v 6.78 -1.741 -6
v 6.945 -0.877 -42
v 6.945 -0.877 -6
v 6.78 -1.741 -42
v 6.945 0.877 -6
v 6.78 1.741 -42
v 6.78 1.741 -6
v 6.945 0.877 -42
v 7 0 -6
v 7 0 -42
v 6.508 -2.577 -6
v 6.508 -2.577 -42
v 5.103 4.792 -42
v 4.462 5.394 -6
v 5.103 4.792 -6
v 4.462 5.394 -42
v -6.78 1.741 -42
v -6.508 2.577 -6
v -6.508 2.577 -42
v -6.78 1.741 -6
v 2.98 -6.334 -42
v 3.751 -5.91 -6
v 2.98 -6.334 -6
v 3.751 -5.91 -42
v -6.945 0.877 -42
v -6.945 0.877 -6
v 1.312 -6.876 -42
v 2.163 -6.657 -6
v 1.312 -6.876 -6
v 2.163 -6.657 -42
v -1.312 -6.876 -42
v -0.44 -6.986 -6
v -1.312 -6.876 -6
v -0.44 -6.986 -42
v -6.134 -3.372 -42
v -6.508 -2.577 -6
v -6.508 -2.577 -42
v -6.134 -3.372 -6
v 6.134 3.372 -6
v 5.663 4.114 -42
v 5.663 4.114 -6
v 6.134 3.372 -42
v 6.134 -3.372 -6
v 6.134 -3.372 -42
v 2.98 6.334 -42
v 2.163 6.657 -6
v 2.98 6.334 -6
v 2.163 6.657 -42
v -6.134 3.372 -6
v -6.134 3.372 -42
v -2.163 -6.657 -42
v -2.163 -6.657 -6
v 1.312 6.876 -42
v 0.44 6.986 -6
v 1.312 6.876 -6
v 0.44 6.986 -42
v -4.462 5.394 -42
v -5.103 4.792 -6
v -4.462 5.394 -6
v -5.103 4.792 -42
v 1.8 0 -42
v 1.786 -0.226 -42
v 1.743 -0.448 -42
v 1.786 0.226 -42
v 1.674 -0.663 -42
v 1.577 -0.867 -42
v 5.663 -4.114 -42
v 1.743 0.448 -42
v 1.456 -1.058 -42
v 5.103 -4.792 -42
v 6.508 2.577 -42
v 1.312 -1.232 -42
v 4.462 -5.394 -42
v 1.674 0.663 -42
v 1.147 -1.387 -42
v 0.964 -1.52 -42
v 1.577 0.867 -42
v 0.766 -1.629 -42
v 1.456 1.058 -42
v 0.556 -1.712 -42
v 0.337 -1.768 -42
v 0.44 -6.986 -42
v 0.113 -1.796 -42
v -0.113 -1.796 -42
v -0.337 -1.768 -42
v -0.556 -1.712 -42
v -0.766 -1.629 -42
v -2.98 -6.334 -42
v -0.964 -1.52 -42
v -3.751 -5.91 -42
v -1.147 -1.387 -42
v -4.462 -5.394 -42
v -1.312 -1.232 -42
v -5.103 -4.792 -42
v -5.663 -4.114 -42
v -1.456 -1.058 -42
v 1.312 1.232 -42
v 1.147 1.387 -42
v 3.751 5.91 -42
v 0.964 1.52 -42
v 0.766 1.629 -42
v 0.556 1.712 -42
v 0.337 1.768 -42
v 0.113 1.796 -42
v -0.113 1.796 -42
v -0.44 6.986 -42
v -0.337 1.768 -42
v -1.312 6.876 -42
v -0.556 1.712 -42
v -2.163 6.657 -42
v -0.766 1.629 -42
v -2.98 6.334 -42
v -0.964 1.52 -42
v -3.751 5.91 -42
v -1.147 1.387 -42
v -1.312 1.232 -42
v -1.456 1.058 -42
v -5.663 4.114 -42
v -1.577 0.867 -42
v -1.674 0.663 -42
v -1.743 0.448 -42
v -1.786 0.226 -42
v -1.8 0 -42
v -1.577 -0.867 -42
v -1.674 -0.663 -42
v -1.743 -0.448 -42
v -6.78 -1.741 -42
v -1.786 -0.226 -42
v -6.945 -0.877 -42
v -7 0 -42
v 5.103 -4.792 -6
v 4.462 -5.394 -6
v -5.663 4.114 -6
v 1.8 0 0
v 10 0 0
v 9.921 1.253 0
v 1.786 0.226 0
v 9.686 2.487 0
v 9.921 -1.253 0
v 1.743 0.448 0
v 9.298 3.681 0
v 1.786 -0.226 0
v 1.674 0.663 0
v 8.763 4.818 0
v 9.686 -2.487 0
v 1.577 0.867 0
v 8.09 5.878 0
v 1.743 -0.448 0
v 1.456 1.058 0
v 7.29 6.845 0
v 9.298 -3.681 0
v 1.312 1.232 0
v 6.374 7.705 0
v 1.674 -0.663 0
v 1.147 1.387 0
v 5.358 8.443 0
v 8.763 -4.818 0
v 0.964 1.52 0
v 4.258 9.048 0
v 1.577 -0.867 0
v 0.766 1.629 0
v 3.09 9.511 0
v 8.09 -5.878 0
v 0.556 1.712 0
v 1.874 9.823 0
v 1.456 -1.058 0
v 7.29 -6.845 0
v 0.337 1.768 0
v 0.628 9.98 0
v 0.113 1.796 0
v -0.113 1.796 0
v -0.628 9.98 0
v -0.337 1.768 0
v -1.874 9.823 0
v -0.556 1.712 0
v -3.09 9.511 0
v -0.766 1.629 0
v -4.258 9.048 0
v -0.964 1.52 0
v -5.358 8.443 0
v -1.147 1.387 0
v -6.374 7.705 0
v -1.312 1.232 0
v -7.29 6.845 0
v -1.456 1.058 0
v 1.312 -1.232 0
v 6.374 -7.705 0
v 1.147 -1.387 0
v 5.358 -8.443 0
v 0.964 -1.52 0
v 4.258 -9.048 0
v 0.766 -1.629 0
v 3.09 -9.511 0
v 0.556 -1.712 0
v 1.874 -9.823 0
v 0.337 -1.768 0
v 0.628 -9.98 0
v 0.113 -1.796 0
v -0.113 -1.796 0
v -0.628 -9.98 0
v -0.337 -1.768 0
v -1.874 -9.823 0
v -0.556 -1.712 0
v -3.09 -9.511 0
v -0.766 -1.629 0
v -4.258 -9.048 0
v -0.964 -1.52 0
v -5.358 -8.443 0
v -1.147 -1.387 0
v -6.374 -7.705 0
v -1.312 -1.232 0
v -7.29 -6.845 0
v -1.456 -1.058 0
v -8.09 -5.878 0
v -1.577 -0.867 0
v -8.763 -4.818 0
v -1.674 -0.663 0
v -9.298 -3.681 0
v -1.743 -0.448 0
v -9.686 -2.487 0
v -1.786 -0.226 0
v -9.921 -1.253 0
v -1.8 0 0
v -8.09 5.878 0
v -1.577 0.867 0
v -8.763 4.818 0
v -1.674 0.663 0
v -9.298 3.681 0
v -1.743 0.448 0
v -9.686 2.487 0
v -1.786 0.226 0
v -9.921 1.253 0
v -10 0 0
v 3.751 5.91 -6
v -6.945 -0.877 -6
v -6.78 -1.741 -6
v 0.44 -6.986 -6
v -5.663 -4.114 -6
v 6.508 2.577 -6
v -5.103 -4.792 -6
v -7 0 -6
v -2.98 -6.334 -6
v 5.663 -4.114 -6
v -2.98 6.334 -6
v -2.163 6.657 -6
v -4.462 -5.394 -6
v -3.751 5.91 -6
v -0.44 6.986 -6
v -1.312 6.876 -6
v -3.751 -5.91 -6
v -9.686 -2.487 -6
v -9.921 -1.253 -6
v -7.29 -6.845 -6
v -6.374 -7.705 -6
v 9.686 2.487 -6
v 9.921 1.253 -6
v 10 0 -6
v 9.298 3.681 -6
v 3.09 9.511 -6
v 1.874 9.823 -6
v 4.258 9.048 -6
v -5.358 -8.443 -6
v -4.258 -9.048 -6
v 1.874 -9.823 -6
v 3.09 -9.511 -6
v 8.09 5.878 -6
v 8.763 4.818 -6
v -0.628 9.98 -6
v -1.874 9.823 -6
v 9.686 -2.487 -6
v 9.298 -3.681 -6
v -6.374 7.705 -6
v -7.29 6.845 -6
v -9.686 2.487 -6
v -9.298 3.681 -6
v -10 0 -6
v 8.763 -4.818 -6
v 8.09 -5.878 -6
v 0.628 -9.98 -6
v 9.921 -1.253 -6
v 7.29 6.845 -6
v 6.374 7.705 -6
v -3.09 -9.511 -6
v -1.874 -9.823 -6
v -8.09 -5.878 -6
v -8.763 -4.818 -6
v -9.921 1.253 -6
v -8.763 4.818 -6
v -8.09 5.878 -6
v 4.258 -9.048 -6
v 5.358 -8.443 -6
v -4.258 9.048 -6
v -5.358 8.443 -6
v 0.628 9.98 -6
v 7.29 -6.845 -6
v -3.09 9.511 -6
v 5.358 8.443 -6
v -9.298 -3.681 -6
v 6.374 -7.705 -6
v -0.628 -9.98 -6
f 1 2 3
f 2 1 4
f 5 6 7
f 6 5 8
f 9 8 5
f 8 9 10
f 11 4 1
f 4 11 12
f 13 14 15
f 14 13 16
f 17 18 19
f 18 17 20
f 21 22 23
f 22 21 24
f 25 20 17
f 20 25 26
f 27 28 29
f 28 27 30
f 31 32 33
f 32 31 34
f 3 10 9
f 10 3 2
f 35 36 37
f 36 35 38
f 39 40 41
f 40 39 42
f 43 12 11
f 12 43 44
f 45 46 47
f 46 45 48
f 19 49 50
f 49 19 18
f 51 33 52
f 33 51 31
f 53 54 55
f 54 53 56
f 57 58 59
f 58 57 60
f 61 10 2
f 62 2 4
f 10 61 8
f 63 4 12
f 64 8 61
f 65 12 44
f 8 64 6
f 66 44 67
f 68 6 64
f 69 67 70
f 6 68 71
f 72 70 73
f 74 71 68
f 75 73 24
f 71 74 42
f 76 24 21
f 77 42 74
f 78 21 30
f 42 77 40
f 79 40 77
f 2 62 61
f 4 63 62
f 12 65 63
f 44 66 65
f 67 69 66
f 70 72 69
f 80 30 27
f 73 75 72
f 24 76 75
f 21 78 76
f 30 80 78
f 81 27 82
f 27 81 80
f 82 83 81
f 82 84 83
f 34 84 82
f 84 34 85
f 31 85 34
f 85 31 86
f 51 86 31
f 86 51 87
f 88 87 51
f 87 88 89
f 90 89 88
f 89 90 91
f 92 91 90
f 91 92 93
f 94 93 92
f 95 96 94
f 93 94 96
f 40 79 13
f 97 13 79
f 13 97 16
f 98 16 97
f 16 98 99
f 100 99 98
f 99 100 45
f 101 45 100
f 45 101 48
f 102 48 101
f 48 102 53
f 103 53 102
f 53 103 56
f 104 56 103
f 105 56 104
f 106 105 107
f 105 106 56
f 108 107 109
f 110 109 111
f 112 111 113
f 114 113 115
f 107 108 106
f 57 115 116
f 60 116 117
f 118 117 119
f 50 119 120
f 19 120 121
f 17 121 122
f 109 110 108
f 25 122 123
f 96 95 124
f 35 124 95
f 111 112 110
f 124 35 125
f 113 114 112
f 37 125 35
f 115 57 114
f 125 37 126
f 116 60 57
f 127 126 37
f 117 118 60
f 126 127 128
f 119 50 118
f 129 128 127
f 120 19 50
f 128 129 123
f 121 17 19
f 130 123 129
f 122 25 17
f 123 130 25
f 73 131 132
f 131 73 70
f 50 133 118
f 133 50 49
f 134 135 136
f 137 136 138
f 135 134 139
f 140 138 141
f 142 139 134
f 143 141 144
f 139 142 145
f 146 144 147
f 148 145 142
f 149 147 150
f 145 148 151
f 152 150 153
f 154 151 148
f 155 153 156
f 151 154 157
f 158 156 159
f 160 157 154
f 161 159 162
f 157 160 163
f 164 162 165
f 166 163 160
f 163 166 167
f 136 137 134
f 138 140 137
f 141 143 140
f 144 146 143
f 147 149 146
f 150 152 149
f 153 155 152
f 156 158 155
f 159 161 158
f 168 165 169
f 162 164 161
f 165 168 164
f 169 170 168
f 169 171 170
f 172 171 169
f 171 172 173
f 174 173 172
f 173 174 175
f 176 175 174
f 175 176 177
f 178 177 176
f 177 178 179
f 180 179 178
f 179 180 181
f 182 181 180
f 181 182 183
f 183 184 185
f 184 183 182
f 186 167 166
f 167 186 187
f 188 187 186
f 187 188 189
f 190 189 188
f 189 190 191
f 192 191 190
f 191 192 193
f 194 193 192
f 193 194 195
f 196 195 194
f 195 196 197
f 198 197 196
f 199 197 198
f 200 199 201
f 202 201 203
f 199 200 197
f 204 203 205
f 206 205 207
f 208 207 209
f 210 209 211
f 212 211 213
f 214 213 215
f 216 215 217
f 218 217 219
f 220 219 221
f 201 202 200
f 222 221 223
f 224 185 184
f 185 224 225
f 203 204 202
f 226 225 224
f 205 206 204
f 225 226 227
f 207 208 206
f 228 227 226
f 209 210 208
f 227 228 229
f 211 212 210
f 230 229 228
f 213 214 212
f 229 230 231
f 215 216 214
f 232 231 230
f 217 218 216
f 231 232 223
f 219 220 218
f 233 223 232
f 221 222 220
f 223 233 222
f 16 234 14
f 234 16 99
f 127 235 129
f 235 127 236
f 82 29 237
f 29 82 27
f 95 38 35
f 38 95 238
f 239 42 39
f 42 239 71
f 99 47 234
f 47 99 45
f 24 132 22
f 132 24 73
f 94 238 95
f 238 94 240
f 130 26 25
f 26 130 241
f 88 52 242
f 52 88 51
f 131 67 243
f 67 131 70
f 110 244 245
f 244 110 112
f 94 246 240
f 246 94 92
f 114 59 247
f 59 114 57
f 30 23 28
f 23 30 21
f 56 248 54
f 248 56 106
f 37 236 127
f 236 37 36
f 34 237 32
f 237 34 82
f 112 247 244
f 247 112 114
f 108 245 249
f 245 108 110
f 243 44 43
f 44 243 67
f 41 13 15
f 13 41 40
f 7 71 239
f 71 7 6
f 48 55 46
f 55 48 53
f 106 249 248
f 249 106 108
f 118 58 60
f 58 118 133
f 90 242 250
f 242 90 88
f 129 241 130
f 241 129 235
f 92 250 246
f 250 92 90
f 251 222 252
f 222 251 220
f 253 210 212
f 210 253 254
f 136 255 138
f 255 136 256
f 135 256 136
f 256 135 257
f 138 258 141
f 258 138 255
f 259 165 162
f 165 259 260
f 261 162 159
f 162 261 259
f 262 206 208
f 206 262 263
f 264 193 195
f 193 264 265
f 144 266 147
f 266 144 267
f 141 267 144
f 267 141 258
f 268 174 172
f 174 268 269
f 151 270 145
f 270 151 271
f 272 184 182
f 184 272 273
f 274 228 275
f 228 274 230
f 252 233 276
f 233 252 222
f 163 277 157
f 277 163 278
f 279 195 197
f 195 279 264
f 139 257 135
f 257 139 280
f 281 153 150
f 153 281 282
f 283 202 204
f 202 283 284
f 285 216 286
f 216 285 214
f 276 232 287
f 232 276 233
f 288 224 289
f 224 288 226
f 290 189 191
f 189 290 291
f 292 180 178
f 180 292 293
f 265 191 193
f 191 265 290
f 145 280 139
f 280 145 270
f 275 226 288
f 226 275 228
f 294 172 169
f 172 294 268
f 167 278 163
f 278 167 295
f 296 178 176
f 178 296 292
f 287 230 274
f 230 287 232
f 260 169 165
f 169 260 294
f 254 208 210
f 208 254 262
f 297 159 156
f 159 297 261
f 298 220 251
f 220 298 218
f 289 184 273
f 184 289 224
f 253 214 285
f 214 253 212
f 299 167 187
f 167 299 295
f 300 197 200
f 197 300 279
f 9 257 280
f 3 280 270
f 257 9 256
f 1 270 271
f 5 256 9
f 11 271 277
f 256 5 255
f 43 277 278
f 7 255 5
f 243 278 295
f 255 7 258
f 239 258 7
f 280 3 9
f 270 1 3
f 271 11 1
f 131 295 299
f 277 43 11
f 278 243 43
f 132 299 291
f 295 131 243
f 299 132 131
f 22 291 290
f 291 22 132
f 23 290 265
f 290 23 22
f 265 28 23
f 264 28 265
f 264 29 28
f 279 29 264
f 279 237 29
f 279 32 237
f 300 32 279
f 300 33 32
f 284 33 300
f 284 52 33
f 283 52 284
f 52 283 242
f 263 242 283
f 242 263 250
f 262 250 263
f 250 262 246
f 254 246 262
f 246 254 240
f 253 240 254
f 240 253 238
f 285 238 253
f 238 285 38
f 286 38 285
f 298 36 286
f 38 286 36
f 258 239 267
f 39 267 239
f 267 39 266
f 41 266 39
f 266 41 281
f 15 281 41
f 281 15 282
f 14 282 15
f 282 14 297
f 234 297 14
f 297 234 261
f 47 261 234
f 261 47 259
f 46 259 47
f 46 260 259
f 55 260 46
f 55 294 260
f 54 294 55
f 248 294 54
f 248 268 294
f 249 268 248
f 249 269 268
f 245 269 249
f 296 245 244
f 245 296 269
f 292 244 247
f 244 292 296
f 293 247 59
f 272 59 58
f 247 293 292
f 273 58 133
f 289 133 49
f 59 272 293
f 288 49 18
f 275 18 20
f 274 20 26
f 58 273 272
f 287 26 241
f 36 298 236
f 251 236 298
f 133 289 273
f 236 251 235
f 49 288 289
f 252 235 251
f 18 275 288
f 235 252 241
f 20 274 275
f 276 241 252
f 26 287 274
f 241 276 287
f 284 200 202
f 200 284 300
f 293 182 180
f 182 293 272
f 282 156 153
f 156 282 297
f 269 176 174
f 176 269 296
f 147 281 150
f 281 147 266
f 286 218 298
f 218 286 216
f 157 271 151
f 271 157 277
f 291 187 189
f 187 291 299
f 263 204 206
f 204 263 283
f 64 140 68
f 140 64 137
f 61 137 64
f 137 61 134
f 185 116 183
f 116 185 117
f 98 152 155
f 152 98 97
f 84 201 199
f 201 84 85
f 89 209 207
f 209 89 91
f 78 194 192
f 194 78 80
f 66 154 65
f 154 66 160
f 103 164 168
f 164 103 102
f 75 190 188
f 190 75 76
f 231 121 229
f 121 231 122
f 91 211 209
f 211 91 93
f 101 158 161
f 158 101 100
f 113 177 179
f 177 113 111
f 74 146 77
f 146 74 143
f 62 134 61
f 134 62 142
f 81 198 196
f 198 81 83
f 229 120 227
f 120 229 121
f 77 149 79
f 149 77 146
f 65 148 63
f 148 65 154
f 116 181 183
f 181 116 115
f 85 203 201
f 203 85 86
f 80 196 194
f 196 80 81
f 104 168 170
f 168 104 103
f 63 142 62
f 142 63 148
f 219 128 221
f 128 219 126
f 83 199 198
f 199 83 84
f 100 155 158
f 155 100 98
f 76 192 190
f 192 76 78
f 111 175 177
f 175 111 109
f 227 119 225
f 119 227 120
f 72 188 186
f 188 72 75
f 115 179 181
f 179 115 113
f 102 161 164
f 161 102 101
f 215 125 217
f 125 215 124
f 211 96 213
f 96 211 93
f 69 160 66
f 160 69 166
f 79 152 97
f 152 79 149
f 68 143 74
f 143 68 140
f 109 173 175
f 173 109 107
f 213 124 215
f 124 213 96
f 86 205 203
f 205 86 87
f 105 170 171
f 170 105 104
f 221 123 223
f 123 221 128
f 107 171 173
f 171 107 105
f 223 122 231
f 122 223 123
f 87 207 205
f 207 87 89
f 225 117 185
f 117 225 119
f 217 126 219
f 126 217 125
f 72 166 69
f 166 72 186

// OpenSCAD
$fn = 50;


difference() {
	union() {
		translate(v = [0, 0, -42.0000000000]) {
			cylinder(h = 42, r = 7.0000000000);
		}
		translate(v = [0, 0, -6.0000000000]) {
			cylinder(h = 6, r = 10.0000000000);
		}
	}
	union() {
		#translate(v = [0, 0, -42]) {
			cylinder(h = 42, r = 1.8000000000);
		}
	}
}
